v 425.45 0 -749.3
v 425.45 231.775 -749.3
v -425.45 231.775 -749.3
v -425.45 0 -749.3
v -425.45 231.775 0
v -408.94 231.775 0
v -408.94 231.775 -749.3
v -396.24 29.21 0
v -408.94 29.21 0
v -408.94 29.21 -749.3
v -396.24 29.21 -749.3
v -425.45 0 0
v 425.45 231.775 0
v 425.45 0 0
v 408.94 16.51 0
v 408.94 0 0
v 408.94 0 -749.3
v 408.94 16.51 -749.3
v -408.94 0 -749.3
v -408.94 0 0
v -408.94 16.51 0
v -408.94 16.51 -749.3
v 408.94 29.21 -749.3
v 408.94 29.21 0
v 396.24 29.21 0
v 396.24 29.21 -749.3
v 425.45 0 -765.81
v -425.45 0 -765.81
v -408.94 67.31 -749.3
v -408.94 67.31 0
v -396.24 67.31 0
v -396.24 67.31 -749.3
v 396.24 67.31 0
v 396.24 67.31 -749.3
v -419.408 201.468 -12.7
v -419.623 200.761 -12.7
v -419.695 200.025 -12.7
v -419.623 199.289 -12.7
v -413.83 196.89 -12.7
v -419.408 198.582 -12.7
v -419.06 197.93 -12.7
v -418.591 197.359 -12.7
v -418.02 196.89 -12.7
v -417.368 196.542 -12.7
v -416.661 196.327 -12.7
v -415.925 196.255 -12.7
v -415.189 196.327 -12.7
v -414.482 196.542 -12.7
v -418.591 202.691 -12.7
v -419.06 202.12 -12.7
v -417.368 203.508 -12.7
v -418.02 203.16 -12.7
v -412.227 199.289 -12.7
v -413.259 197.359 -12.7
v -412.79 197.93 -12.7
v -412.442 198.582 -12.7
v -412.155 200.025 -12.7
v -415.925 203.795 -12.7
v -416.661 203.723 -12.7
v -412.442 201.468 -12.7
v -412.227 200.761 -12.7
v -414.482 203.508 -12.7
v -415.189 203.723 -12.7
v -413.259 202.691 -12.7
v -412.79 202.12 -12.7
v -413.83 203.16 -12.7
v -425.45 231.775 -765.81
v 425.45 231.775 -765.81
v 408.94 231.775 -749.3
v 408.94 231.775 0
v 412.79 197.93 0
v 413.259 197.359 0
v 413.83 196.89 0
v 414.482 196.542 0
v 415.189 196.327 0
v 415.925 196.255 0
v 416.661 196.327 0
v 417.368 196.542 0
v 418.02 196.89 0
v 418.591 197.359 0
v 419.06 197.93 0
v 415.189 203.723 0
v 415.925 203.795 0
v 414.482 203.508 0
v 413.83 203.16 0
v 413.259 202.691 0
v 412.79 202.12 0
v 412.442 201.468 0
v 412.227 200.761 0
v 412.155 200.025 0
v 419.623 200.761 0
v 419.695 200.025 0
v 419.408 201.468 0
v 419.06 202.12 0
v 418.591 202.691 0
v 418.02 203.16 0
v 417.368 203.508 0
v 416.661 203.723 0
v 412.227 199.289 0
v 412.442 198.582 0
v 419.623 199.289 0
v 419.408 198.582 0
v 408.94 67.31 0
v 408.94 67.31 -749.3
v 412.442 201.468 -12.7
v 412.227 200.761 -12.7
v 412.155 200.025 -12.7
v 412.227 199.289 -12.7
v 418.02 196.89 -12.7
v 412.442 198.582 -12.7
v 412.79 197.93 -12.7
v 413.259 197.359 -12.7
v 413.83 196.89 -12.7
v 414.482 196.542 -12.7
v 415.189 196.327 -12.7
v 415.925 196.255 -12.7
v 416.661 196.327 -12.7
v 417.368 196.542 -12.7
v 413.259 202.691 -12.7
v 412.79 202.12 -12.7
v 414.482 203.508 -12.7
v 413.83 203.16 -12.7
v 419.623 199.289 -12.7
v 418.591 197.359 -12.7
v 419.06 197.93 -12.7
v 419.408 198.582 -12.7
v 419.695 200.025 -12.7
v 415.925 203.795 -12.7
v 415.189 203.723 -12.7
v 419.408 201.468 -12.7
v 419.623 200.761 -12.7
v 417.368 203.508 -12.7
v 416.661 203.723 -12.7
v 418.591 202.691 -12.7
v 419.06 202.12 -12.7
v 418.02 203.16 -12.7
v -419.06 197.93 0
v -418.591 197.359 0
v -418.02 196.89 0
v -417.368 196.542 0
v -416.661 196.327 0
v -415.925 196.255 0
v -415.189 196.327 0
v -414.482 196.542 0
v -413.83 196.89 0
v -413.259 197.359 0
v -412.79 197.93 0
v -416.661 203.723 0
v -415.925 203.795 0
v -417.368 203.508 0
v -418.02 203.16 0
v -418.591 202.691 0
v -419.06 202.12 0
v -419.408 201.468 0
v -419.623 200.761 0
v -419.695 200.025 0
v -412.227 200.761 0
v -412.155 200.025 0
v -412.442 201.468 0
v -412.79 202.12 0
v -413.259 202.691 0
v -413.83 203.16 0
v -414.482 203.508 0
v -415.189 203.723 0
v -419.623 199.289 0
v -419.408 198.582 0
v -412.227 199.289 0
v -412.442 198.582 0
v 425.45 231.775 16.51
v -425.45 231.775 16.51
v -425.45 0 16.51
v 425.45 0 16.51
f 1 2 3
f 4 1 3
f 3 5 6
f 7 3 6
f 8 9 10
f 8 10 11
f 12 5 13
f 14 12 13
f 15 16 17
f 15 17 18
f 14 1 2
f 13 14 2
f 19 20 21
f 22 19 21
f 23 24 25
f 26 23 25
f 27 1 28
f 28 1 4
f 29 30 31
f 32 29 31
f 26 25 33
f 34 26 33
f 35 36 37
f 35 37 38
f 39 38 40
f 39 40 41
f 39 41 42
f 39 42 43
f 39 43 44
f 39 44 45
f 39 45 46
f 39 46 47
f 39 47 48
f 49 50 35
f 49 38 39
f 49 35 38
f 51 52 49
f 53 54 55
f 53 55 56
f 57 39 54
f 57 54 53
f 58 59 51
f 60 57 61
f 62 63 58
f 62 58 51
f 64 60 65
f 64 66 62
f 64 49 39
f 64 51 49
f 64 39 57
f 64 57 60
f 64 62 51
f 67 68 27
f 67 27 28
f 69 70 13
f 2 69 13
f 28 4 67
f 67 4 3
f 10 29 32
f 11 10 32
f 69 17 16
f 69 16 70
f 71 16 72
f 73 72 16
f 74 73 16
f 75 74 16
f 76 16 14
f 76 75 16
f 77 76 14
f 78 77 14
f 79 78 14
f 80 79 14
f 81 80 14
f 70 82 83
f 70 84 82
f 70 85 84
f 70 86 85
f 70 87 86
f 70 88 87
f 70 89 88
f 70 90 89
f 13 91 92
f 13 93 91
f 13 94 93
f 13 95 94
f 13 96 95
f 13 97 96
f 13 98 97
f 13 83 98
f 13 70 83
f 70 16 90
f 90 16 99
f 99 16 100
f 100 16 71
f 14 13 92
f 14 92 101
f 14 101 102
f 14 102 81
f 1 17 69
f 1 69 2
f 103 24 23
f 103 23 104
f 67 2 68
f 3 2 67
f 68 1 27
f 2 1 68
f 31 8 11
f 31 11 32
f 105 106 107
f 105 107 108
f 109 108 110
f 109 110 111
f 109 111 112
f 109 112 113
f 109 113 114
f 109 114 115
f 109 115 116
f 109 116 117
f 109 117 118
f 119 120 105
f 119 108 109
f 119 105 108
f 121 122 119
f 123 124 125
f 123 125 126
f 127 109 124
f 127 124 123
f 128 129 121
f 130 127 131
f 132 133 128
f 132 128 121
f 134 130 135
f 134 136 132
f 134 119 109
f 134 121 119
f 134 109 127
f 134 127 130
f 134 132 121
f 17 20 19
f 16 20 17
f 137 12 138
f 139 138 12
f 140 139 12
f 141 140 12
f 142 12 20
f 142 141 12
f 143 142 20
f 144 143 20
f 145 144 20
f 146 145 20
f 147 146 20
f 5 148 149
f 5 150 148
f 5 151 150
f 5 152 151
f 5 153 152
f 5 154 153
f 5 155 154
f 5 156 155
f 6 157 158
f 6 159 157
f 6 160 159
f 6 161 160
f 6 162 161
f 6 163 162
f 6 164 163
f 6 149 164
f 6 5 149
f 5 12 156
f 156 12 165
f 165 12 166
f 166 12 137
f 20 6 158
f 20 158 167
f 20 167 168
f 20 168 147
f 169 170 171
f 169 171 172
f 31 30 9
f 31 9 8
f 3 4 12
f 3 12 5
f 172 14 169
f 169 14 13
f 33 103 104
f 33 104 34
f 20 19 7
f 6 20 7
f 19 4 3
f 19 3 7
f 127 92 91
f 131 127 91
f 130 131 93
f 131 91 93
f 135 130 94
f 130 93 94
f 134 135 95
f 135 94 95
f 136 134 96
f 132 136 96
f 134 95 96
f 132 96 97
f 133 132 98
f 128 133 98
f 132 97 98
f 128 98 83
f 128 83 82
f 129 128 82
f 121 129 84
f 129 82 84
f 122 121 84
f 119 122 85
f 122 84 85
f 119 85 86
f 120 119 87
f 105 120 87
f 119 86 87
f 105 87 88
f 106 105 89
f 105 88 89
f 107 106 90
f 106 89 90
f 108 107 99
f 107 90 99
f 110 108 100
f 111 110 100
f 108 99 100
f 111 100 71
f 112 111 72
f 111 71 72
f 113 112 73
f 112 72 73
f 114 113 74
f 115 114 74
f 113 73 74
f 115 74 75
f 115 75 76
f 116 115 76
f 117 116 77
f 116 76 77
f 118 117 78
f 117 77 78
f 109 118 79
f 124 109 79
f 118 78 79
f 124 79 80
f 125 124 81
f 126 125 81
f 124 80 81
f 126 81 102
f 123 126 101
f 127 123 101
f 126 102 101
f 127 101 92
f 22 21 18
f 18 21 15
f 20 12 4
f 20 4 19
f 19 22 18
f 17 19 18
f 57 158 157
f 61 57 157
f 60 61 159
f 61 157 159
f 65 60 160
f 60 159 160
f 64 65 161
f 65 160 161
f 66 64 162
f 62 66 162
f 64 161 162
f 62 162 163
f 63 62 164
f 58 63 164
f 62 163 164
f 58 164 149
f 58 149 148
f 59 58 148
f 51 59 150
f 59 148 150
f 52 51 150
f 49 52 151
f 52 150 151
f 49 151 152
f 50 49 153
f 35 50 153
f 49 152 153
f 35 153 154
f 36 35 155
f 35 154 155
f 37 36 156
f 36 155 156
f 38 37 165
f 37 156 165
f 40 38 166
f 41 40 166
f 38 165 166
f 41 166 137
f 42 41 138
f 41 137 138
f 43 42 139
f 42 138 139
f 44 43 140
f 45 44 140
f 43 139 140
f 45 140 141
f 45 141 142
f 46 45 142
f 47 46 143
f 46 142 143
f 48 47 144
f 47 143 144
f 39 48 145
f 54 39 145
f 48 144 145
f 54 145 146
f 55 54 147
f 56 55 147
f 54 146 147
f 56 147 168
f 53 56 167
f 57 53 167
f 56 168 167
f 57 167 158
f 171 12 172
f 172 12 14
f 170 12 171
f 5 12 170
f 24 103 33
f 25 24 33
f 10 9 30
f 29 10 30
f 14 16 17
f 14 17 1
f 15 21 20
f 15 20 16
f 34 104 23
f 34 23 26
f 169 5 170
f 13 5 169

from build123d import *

# Parameters (mm, degrees)
SKETCH1_W             = 16.51
SKETCH1_H             = 231.775
BOSS_EXTRUDE1_DEPTH   = 749.3
BOSS_EXTRUDE1_2_DEPTH = 749.3
SKETCH1_3_W           = 817.88
SKETCH1_3_H           = 16.51
BOSS_EXTRUDE2_DEPTH   = 749.3
SKETCH2_W             = 850.9
SKETCH2_H             = 231.775
BOSS_EXTRUDE3_DEPTH   = 16.51
SKETCH3_W             = 12.7
SKETCH3_H             = 38.1
BOSS_EXTRUDE4_DEPTH   = 749.3
SKETCH7_R             = 3.7703125
CUT_EXTRUDE2_DEPTH    = 12.7
SKETCH15_W            = 850.9
SKETCH15_H            = 231.775
BOSS_EXTRUDE11_DEPTH  = 16.51


with BuildPart() as part:
    # Sketch1 → Boss-Extrude1 (new body)
    with BuildSketch(Plane.XY):
        with Locations((-417.195, 115.8875)):
            Rectangle(SKETCH1_W, SKETCH1_H)
    extrude(amount=-BOSS_EXTRUDE1_DEPTH)


with BuildPart() as body_2:
    # Sketch1 → Boss-Extrude1 2 (new body)
    with BuildSketch(Plane.XY):
        with Locations((417.195, 115.8875)):
            Rectangle(SKETCH1_W, SKETCH1_H)
    extrude(amount=-BOSS_EXTRUDE1_2_DEPTH)


with BuildPart() as body_3:
    # Sketch1<3> → Boss-Extrude2 (new body)
    with BuildSketch(Plane.XY):
        with Locations((0, 8.255)):
            Rectangle(SKETCH1_3_W, SKETCH1_3_H)
    extrude(amount=-BOSS_EXTRUDE2_DEPTH)


with BuildPart() as body_4:
    # Sketch2 → Boss-Extrude3 (new body)
    with BuildSketch(Plane(origin=(0, 0, -749.3), x_dir=(-1, 0, 0), z_dir=(0, 0, -1))):
        with Locations((0, 115.8875)):
            Rectangle(SKETCH2_W, SKETCH2_H)
    extrude(amount=BOSS_EXTRUDE3_DEPTH)


with BuildPart() as body_5:
    # Sketch3 → Boss-Extrude4 (new body)
    with BuildSketch(Plane.XY):
        with Locations((-402.59, 48.26)):
            Rectangle(SKETCH3_W, SKETCH3_H)
    extrude(amount=-BOSS_EXTRUDE4_DEPTH)


with BuildPart() as body_6:
    # Mirror1: mirrored copy
    add(body_5.part.mirror(Plane(origin=(0, 0, 0), x_dir=(0, 0, 1), z_dir=(1, 0, 0))))


with BuildPart() as cut_extrude2_tool:
    # Sketch7 → Cut-Extrude2 (new body)
    with BuildSketch(Plane.XY):
        with Locations((-415.925, 200.025)):
            Circle(SKETCH7_R)
        with Locations((415.925, 200.025)):
            Circle(SKETCH7_R)
    extrude(amount=-CUT_EXTRUDE2_DEPTH)


with BuildPart() as part_1:
    add(part.part)

    # Cut-Extrude2: cut by cut_extrude2_tool
    add(cut_extrude2_tool.part, mode=Mode.SUBTRACT)


with BuildPart() as body_2_1:
    add(body_2.part)

    # Cut-Extrude2: cut by cut_extrude2_tool
    add(cut_extrude2_tool.part, mode=Mode.SUBTRACT)


with BuildPart() as body_7:
    # Sketch15 → Boss-Extrude11 (new body)
    with BuildSketch(Plane.XY):
        with Locations((0, 115.8875)):
            Rectangle(SKETCH15_W, SKETCH15_H)
    extrude(amount=BOSS_EXTRUDE11_DEPTH)


solid = Compound([body_3.part, body_4.part, body_5.part, body_6.part, part_1.part, body_2_1.part, body_7.part])
